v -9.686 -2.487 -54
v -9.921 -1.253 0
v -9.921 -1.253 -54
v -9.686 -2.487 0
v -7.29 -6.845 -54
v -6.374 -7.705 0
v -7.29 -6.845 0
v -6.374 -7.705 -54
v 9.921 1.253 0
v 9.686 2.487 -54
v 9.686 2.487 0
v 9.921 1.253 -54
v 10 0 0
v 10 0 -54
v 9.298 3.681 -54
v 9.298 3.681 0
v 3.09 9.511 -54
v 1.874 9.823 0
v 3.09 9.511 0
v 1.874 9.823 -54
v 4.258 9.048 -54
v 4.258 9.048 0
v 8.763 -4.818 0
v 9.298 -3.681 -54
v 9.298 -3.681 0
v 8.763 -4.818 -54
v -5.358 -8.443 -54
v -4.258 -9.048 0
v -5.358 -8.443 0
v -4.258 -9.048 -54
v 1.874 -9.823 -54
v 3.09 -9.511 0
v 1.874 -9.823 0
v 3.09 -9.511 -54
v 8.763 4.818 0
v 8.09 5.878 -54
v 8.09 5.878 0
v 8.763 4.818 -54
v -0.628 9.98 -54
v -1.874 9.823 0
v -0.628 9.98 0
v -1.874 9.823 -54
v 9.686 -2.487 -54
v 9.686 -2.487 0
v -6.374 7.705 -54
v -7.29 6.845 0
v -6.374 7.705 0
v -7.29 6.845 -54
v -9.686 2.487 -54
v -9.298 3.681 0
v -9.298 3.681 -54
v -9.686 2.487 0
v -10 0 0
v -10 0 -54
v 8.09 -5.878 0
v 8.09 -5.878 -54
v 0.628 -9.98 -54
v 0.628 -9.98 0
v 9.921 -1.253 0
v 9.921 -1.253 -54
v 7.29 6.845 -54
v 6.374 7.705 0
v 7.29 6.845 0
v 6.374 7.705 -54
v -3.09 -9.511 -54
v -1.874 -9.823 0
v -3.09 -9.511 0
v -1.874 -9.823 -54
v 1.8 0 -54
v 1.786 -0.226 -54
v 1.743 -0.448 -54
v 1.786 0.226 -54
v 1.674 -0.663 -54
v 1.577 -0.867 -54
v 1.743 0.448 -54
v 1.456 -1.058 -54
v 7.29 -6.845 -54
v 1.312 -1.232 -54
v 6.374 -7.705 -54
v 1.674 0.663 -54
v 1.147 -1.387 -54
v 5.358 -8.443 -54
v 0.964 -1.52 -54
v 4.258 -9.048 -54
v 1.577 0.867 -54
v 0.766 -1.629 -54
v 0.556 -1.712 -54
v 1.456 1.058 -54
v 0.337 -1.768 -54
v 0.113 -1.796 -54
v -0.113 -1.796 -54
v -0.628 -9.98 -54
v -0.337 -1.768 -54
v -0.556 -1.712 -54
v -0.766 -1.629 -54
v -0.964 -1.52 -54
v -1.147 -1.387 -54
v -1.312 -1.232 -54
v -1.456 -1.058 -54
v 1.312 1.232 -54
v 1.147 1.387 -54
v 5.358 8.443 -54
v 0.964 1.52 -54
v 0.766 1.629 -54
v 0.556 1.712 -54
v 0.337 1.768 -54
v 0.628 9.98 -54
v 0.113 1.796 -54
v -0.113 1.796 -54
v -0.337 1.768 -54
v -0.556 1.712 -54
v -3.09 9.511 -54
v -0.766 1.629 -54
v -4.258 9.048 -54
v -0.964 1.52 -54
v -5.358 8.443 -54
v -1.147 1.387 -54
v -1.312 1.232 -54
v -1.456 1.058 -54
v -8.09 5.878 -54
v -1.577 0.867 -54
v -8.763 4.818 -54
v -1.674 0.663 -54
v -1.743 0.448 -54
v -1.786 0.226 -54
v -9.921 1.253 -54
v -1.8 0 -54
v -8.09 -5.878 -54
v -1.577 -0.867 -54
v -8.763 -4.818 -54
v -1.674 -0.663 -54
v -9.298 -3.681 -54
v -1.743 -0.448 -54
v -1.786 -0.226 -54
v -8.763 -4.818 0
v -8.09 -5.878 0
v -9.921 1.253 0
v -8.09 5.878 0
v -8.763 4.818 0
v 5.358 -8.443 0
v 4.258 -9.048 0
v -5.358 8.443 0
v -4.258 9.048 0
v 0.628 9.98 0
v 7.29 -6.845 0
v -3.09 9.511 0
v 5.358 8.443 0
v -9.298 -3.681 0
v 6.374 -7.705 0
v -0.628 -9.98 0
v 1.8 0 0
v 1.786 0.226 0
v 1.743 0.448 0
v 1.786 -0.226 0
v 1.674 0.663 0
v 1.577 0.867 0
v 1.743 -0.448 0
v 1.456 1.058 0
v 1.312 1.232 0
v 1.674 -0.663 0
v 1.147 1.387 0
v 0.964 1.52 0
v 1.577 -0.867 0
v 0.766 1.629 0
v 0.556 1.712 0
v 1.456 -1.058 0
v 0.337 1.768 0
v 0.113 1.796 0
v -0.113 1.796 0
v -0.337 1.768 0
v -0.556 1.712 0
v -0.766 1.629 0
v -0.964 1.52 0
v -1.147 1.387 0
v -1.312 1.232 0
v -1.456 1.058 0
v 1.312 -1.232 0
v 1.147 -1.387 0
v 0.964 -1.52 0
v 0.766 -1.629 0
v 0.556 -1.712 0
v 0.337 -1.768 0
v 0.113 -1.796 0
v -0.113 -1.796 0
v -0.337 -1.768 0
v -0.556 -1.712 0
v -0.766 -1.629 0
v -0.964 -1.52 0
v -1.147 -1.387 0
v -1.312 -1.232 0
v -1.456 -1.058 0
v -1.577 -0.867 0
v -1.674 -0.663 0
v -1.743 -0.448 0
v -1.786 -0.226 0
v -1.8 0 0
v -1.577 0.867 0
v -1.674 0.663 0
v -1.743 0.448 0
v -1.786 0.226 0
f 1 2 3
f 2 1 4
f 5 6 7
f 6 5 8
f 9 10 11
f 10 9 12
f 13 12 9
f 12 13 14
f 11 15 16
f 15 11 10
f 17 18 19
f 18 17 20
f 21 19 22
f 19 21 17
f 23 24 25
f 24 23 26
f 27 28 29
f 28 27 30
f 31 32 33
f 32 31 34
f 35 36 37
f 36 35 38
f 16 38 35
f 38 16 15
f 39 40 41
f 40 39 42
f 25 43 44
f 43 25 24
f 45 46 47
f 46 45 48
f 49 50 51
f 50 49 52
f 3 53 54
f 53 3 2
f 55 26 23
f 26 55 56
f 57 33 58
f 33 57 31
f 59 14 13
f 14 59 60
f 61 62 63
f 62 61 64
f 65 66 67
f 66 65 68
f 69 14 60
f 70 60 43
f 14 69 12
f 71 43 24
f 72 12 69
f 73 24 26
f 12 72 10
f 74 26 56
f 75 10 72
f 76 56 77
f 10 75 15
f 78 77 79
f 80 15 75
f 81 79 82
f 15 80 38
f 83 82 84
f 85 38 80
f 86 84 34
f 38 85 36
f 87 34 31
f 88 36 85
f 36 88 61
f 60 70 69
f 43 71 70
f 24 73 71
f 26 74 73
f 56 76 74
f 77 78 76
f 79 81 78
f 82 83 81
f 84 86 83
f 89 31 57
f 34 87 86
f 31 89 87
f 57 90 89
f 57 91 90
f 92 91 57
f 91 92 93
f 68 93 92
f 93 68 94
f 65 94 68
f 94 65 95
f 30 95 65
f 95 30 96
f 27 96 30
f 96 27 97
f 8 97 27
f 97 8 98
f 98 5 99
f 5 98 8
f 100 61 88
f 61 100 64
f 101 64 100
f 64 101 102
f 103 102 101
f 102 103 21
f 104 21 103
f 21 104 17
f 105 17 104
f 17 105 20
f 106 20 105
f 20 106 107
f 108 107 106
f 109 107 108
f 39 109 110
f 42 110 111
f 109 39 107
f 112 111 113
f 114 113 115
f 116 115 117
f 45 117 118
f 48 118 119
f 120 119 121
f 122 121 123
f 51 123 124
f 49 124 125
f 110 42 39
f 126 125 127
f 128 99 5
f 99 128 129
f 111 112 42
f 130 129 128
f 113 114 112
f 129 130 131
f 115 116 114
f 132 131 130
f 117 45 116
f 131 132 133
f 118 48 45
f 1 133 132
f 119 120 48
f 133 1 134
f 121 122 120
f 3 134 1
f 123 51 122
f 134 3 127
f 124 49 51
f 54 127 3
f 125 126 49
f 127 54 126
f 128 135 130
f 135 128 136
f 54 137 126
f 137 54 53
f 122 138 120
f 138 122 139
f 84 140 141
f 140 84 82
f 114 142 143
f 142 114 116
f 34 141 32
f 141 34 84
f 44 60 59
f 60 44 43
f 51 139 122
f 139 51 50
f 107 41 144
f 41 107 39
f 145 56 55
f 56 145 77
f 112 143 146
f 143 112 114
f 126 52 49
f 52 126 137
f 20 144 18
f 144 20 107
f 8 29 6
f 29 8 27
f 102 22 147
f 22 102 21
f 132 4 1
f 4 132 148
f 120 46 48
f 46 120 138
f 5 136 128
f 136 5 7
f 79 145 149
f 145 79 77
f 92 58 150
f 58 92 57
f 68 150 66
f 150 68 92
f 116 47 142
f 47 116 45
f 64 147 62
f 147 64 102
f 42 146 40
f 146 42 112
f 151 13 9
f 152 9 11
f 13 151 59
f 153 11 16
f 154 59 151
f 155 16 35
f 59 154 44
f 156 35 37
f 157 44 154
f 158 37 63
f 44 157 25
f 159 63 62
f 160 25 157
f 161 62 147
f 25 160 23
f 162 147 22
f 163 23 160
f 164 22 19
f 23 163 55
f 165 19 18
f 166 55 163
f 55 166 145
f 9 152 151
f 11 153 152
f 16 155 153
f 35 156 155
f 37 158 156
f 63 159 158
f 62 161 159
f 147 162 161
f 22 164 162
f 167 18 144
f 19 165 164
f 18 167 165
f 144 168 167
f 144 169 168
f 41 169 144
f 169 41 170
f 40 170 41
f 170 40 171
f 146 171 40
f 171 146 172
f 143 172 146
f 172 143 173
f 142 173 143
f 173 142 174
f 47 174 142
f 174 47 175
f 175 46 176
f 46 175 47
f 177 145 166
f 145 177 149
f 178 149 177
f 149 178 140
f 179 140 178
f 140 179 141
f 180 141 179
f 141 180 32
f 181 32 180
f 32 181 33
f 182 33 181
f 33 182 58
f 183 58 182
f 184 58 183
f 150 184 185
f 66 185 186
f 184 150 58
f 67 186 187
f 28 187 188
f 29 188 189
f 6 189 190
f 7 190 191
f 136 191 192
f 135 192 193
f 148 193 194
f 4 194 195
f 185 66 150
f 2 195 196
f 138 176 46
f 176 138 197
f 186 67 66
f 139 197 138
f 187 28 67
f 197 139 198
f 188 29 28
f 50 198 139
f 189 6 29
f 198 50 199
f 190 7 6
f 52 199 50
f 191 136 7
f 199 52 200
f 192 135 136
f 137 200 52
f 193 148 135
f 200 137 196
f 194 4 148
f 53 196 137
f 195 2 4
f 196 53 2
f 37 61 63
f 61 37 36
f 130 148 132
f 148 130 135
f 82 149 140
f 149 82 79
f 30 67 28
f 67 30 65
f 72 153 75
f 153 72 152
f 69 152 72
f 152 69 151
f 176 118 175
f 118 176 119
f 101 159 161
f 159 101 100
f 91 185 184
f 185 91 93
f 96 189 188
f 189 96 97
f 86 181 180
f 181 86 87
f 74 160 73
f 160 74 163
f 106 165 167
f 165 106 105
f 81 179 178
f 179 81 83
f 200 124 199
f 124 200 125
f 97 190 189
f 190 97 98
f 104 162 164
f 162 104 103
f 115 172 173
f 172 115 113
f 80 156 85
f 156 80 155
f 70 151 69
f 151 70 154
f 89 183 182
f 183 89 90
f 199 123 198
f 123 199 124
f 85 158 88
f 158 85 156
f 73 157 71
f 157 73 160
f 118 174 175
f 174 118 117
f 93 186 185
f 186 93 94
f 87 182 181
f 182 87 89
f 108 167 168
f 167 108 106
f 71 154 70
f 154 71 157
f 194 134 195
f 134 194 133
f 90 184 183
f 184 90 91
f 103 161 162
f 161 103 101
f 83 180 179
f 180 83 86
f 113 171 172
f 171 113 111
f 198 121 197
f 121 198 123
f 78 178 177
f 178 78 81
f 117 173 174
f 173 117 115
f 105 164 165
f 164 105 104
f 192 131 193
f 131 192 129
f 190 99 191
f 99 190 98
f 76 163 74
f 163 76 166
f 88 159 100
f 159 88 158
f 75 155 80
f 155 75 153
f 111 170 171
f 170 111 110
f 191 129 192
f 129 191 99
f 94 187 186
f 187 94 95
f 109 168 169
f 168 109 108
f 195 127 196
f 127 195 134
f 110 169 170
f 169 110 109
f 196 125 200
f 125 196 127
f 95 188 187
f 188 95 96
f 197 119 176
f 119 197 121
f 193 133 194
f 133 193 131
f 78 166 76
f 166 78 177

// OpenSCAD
$fn = 50;


difference() {
	union() {
		translate(v = [0, 0, -54.0000000000]) {
			cylinder(h = 54, r = 10.0000000000);
		}
	}
	union() {
		#translate(v = [0, 0, -54]) {
			cylinder(h = 54, r = 1.8000000000);
		}
	}
}
